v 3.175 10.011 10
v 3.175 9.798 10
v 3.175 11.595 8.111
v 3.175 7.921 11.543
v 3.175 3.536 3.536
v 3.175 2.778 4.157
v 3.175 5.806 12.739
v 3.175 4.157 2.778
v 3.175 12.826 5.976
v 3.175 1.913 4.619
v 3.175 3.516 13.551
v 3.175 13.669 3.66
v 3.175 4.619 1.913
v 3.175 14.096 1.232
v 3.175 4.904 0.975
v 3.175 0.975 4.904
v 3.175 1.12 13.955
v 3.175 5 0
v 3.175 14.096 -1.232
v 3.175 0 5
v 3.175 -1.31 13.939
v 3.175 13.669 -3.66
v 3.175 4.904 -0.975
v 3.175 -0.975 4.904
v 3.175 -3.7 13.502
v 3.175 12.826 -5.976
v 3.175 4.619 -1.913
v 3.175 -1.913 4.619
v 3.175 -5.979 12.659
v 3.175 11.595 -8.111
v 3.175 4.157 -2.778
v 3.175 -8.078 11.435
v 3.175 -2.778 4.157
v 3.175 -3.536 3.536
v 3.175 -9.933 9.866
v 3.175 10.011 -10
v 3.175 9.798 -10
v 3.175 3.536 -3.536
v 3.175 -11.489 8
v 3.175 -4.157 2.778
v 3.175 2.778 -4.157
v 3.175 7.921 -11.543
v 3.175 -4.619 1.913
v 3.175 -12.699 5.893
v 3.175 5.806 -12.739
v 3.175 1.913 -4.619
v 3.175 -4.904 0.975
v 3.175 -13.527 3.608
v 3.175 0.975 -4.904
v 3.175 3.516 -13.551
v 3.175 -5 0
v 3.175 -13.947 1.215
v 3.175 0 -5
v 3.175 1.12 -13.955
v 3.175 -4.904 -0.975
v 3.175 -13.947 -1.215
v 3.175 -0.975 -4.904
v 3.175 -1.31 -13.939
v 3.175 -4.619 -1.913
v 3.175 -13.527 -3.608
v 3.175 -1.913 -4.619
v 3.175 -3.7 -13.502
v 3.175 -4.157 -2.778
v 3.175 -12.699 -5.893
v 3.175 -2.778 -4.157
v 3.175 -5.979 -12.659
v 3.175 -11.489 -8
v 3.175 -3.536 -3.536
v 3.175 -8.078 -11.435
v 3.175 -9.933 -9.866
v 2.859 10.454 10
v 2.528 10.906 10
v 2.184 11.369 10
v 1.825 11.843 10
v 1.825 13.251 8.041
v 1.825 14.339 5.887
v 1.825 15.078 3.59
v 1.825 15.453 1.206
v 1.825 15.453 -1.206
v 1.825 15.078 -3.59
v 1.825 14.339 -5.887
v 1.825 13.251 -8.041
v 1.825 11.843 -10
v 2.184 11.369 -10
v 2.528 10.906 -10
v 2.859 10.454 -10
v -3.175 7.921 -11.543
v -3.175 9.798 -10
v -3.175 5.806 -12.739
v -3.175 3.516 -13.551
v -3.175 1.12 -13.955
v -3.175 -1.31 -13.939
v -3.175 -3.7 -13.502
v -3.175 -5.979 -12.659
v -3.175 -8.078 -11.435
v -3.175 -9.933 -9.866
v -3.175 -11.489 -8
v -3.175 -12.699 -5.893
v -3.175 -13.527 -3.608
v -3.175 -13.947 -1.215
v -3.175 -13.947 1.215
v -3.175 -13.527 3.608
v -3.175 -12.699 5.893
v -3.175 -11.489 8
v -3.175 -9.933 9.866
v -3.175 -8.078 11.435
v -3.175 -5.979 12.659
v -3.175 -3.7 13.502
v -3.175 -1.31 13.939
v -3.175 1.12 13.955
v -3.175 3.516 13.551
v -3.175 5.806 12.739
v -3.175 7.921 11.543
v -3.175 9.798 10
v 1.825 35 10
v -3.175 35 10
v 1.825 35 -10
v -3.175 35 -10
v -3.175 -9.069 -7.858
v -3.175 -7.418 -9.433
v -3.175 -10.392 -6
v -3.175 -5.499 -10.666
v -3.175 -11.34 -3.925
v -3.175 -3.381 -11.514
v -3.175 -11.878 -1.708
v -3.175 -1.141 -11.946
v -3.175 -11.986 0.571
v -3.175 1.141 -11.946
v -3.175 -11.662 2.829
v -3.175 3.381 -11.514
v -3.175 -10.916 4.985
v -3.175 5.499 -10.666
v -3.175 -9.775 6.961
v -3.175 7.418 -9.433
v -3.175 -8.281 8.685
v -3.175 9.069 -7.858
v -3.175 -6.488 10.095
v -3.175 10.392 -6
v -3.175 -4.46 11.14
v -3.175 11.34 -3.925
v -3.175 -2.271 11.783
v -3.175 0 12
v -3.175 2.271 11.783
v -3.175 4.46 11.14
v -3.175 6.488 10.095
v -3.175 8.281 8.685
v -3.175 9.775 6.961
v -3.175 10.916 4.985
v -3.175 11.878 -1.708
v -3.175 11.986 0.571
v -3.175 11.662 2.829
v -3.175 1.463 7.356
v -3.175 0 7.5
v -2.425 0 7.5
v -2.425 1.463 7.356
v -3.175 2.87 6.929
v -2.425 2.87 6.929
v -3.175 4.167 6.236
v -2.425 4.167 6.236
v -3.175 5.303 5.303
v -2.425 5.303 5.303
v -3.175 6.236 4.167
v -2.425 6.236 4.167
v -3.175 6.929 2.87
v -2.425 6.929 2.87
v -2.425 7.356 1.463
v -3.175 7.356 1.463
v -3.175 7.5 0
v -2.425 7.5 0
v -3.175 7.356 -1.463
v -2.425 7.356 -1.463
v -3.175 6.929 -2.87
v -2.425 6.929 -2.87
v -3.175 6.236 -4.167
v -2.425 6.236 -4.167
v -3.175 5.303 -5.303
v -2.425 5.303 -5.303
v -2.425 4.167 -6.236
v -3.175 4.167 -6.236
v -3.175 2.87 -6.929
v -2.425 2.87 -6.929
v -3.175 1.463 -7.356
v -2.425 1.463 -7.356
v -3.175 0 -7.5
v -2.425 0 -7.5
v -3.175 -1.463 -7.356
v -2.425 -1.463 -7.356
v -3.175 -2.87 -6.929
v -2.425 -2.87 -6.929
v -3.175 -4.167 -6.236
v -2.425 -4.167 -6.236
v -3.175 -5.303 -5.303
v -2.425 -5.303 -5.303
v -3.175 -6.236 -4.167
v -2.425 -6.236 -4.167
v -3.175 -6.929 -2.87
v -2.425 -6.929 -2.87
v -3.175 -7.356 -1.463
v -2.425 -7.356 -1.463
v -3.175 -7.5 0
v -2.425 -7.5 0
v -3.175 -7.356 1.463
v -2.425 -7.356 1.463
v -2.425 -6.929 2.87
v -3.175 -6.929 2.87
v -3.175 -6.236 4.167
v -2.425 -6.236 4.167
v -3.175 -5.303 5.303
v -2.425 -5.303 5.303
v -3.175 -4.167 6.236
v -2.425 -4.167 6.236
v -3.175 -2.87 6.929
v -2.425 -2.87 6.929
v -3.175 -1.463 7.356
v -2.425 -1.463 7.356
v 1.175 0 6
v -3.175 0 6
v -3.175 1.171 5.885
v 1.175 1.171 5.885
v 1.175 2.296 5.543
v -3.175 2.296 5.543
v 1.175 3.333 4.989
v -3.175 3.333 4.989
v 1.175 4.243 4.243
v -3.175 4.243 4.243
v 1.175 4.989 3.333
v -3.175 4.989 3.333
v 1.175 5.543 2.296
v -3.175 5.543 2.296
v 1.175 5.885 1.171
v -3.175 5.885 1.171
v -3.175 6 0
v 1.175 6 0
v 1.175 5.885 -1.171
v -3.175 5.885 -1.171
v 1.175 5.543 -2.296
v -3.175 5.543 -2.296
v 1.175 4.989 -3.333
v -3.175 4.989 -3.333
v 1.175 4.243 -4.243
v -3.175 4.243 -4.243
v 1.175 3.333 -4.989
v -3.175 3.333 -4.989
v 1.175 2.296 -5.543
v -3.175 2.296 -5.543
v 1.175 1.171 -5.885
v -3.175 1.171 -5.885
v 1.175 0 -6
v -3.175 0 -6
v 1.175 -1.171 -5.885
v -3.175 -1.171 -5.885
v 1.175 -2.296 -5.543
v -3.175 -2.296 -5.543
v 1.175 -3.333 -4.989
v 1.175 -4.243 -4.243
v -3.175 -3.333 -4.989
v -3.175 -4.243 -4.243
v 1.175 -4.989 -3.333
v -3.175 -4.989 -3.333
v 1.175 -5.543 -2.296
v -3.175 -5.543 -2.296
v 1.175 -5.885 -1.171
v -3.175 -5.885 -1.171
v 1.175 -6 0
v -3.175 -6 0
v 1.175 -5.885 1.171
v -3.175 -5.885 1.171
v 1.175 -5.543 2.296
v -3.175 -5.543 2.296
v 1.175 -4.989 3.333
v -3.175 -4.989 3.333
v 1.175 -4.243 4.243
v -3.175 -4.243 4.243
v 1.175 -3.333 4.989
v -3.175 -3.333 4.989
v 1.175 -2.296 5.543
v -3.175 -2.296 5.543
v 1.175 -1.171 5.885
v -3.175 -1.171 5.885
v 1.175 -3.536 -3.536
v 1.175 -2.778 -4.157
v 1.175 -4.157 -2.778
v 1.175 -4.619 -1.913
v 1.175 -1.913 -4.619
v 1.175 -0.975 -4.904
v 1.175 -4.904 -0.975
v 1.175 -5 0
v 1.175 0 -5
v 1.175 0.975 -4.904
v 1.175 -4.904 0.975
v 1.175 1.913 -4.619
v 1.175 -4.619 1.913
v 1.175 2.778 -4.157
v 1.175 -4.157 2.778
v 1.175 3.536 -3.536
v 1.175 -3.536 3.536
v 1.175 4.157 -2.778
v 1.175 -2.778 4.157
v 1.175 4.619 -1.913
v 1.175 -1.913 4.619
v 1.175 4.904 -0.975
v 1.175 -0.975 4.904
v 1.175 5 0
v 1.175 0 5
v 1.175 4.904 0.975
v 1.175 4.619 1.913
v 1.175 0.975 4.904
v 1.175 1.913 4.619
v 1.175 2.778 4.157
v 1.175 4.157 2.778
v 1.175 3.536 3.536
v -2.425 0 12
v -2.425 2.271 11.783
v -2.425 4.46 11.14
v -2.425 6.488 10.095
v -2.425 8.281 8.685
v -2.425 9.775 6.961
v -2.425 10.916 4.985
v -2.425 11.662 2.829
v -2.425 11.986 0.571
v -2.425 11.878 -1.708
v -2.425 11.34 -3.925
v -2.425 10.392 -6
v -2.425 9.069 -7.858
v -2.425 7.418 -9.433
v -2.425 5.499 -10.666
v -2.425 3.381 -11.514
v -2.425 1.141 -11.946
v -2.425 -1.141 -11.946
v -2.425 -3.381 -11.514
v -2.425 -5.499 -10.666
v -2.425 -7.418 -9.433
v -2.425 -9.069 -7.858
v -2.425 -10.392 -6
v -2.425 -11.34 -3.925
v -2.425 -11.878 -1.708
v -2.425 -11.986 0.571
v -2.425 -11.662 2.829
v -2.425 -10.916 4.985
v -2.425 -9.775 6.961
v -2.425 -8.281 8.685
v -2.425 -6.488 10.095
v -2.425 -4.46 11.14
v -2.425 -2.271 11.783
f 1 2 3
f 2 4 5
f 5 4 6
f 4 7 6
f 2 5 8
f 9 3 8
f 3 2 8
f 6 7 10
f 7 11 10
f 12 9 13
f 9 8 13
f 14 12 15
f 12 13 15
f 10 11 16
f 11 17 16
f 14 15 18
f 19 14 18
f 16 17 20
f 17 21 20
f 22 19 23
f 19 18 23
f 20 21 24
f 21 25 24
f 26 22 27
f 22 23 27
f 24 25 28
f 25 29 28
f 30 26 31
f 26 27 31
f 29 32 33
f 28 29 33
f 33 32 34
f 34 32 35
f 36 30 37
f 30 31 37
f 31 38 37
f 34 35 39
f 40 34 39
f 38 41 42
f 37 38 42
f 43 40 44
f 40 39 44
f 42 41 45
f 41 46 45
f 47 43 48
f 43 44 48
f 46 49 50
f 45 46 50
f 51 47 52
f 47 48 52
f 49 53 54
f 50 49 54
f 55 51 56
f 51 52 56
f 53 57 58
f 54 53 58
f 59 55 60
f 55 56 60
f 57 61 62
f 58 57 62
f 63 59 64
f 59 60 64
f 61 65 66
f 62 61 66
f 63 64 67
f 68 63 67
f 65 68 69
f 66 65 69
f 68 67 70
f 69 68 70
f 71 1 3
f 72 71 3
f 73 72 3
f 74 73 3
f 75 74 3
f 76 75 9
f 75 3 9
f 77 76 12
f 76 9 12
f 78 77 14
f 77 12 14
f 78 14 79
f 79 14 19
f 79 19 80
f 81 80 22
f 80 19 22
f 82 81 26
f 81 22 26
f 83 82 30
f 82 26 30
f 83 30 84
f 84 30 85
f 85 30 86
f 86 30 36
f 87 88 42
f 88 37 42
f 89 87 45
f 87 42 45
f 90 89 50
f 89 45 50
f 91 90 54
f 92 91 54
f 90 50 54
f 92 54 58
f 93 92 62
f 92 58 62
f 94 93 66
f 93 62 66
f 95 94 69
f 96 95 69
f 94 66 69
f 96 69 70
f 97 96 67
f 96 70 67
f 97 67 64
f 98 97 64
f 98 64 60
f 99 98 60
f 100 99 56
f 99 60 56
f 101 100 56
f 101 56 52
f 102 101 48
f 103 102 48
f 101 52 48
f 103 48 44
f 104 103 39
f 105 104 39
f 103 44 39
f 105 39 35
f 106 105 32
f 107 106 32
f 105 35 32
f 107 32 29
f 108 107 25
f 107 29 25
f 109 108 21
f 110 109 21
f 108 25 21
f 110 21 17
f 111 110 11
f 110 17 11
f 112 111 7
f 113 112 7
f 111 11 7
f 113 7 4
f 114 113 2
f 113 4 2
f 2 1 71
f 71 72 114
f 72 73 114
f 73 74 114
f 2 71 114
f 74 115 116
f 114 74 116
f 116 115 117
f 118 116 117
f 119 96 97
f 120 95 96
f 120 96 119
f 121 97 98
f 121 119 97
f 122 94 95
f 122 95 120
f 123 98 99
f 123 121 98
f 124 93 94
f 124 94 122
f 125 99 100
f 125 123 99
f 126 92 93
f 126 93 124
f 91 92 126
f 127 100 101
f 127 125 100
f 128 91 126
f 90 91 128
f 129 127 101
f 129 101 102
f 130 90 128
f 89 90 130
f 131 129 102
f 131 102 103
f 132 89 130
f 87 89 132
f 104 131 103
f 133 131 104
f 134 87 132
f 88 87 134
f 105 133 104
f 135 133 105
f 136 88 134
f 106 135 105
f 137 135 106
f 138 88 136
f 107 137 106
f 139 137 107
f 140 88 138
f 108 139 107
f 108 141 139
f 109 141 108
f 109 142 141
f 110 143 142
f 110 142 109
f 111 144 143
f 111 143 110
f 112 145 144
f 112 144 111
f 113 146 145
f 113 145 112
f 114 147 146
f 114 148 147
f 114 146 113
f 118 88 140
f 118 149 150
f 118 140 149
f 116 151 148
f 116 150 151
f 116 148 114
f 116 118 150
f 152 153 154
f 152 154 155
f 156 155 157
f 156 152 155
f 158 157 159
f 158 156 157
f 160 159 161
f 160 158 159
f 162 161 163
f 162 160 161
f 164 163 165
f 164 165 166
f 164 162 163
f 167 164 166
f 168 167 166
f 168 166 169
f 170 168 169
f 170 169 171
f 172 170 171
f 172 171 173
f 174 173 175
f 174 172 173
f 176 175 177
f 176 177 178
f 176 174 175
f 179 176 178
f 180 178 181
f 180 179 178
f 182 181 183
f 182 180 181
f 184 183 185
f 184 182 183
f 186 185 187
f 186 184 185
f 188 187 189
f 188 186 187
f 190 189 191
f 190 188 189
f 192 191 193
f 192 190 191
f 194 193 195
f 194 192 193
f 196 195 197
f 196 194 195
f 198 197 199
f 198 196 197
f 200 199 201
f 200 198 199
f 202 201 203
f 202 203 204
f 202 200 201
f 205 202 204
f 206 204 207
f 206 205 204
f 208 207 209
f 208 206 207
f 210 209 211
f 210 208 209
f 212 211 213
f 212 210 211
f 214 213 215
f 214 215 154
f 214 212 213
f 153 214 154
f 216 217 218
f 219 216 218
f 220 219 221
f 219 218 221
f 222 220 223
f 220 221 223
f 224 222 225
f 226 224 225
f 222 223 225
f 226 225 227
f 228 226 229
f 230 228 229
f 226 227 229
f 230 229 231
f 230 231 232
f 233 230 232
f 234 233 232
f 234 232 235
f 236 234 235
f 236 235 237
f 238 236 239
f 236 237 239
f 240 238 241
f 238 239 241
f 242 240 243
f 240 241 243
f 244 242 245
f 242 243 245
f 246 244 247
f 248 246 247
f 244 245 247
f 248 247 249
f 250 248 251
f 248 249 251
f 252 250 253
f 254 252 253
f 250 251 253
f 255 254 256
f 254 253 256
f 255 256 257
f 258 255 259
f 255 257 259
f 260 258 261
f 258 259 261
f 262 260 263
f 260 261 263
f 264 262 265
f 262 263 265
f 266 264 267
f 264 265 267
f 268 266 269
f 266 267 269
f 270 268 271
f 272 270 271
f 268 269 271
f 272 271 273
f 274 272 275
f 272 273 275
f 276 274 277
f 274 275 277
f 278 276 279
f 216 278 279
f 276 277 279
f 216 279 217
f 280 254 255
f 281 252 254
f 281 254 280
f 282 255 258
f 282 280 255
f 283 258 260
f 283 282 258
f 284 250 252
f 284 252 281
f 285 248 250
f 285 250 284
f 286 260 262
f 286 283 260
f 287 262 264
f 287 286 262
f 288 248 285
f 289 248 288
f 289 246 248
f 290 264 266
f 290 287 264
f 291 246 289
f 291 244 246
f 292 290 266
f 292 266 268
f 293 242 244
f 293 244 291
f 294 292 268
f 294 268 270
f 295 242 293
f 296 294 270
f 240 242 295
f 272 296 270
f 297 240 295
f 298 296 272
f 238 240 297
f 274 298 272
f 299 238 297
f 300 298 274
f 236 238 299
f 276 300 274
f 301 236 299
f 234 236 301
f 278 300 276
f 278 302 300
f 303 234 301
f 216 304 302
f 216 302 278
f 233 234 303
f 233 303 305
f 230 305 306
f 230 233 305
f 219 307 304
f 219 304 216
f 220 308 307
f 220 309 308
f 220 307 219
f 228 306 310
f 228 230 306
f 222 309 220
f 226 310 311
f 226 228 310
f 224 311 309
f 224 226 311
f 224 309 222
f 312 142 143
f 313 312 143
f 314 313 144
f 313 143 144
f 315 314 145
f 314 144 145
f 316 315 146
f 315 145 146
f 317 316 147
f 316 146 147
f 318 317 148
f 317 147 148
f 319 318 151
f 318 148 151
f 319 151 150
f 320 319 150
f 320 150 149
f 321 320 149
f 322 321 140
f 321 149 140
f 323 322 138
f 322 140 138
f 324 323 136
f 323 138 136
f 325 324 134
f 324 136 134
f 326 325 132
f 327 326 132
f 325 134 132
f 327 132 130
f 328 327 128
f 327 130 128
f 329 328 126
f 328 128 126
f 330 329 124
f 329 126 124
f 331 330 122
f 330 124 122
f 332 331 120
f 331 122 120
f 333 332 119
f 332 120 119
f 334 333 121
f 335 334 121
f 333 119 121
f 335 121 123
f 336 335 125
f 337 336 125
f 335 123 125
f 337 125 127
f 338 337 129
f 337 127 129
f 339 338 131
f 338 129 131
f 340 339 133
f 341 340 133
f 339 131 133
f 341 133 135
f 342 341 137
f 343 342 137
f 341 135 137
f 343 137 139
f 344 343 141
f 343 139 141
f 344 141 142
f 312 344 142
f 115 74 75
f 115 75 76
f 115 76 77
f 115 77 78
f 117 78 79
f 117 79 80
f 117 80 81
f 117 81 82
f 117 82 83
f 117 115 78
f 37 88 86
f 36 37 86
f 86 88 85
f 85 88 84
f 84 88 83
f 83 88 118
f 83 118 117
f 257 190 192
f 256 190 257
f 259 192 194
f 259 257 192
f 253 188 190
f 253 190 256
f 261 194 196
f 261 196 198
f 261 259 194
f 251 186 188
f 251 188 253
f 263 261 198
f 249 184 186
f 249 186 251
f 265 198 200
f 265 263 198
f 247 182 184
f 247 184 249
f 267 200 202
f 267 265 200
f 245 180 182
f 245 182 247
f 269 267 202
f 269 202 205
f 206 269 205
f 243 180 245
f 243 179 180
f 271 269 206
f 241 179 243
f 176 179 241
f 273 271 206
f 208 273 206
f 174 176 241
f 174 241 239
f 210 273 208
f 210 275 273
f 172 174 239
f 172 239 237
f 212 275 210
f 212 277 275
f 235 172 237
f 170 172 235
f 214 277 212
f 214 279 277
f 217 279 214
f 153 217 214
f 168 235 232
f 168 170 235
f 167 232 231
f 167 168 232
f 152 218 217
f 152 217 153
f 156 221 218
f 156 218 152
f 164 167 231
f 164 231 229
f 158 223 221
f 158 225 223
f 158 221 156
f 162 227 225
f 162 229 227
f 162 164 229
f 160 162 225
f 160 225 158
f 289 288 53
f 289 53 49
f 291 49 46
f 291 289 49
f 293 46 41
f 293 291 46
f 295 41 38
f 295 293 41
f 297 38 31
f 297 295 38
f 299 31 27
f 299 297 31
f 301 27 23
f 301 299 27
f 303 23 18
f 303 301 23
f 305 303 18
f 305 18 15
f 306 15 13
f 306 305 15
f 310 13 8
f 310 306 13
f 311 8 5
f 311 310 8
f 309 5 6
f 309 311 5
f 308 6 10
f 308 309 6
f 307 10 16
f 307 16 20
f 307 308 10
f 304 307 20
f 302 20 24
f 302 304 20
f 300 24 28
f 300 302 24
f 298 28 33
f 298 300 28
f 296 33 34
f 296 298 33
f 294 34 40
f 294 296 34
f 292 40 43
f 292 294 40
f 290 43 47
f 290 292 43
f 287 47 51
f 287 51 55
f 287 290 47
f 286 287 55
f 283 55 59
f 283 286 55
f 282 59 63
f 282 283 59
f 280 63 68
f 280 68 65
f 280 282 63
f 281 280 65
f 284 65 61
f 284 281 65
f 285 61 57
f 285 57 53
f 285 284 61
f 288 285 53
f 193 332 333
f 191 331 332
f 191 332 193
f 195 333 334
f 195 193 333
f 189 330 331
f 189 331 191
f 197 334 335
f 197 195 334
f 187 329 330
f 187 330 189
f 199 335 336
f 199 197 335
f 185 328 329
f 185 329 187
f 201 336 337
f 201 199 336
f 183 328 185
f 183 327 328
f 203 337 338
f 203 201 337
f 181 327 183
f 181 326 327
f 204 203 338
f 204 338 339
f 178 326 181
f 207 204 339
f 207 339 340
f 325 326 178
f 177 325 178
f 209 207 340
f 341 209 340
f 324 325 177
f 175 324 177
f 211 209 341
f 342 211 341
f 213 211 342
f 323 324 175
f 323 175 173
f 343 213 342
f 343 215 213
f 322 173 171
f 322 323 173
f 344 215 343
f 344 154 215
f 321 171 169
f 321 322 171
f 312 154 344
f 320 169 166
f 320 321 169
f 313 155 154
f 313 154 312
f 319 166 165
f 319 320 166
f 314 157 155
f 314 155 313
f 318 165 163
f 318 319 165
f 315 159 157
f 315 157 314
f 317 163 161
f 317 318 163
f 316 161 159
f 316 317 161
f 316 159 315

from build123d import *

# Parameters (mm, degrees)
SKETCH1_R           = 5
BOSS_EXTRUDE1_DEPTH = 3.175
SKETCH2_R           = 6
CUT_EXTRUDE1_DEPTH  = 4.35
CUT_EXTRUDE2_DEPTH  = 1.35
CHAMFER2_SIZE       = 1.5
SKETCH8_R           = 12
SKETCH8_R_2         = 7.5
CUT_EXTRUDE3_DEPTH  = 0.75


with BuildPart() as part:
    # Sketch1 → Boss-Extrude1 (new, symmetric)
    with BuildSketch(Plane(origin=(0, 0, 0), x_dir=(0, 0, -1), z_dir=(1, 0, 0))):
        with BuildLine():
            Line((-10, 35), (10, 35))
            Line((10, 35), (10, 9.797958971))
            ThreePointArc((10, 9.797958971), (0, -14), (-10, 9.797958971))
            Line((-10, 9.797958971), (-10, 35))
        make_face()
        Circle(SKETCH1_R, mode=Mode.SUBTRACT)
    extrude(amount=BOSS_EXTRUDE1_DEPTH, both=True)

    # Sketch2 → Cut-Extrude1 (cut)
    with BuildSketch(Plane.ZY.offset(3.175)):
        Circle(SKETCH2_R)
    extrude(amount=-CUT_EXTRUDE1_DEPTH, mode=Mode.SUBTRACT)

    # Sketch4 → Cut-Extrude2 (cut)
    with BuildSketch(Plane.ZY.offset(-3.175)):
        with BuildLine():
            Line((-16.06497938, 41.777700925), (20.751052424, 41.777700925))
            Line((20.751052424, 41.777700925), (18.684504783, 1.284491351))
            Line((18.684504783, 1.284491351), (13.967034386, 0.960182519))
            ThreePointArc((13.967034386, 0.960182519), (0, 14), (-13.967034386, 0.960182519))
            Line((-13.967034386, 0.960182519), (-15.162675902, -1.531420388))
            Line((-15.162675902, -1.531420388), (-19.899722353, 37.471795214))
            Line((-19.899722353, 37.471795214), (-16.06497938, 41.777700925))
        make_face()
    extrude(amount=CUT_EXTRUDE2_DEPTH, mode=Mode.SUBTRACT)

    # Chamfer2
    # the kernel refuses this chamfer: 1.5 mm, written as the material it adds along each edge
    with BuildSketch(Plane(origin=(1.825, 0, 0), x_dir=(0, 0.4790238441764441, 0.8778018892155689), z_dir=(0, -0.8778018892155689, 0.4790238441764441))) as chamfer2_piece_1_section:
        Polygon((14 + CHAMFER2_SIZE, 0), (14, -CHAMFER2_SIZE), (14, 0), align=None)
    chamfer2_piece_1 = revolve(axis=Axis((1.825, 0, 0), (-1, 0, 0)), revolution_arc=122.756665739, mode=Mode.PRIVATE)
    chamfer2_piece_1 = split(chamfer2_piece_1, bisect_by=Plane(origin=(2.457619264, 14.825045671, 10), z_dir=(0, 0, -1)), keep=Keep.TOP, mode=Mode.PRIVATE)
    chamfer2_piece_1 = split(chamfer2_piece_1, bisect_by=Plane(origin=(3.175, 14.825045671, 0), z_dir=(-1, 0, 0)), keep=Keep.TOP, mode=Mode.PRIVATE)
    chamfer2_piece_1 = split(chamfer2_piece_1, bisect_by=Plane(origin=(2.457619264, 14.825045671, -10), z_dir=(0, 0, 1)), keep=Keep.TOP, mode=Mode.PRIVATE)
    add(chamfer2_piece_1)

    # Sketch8 → Cut-Extrude3 (cut)
    with BuildSketch(Plane.ZY.offset(3.175)):
        Circle(SKETCH8_R)
        Circle(SKETCH8_R_2, mode=Mode.SUBTRACT)
    extrude(amount=-CUT_EXTRUDE3_DEPTH, mode=Mode.SUBTRACT)


solid = part.part
